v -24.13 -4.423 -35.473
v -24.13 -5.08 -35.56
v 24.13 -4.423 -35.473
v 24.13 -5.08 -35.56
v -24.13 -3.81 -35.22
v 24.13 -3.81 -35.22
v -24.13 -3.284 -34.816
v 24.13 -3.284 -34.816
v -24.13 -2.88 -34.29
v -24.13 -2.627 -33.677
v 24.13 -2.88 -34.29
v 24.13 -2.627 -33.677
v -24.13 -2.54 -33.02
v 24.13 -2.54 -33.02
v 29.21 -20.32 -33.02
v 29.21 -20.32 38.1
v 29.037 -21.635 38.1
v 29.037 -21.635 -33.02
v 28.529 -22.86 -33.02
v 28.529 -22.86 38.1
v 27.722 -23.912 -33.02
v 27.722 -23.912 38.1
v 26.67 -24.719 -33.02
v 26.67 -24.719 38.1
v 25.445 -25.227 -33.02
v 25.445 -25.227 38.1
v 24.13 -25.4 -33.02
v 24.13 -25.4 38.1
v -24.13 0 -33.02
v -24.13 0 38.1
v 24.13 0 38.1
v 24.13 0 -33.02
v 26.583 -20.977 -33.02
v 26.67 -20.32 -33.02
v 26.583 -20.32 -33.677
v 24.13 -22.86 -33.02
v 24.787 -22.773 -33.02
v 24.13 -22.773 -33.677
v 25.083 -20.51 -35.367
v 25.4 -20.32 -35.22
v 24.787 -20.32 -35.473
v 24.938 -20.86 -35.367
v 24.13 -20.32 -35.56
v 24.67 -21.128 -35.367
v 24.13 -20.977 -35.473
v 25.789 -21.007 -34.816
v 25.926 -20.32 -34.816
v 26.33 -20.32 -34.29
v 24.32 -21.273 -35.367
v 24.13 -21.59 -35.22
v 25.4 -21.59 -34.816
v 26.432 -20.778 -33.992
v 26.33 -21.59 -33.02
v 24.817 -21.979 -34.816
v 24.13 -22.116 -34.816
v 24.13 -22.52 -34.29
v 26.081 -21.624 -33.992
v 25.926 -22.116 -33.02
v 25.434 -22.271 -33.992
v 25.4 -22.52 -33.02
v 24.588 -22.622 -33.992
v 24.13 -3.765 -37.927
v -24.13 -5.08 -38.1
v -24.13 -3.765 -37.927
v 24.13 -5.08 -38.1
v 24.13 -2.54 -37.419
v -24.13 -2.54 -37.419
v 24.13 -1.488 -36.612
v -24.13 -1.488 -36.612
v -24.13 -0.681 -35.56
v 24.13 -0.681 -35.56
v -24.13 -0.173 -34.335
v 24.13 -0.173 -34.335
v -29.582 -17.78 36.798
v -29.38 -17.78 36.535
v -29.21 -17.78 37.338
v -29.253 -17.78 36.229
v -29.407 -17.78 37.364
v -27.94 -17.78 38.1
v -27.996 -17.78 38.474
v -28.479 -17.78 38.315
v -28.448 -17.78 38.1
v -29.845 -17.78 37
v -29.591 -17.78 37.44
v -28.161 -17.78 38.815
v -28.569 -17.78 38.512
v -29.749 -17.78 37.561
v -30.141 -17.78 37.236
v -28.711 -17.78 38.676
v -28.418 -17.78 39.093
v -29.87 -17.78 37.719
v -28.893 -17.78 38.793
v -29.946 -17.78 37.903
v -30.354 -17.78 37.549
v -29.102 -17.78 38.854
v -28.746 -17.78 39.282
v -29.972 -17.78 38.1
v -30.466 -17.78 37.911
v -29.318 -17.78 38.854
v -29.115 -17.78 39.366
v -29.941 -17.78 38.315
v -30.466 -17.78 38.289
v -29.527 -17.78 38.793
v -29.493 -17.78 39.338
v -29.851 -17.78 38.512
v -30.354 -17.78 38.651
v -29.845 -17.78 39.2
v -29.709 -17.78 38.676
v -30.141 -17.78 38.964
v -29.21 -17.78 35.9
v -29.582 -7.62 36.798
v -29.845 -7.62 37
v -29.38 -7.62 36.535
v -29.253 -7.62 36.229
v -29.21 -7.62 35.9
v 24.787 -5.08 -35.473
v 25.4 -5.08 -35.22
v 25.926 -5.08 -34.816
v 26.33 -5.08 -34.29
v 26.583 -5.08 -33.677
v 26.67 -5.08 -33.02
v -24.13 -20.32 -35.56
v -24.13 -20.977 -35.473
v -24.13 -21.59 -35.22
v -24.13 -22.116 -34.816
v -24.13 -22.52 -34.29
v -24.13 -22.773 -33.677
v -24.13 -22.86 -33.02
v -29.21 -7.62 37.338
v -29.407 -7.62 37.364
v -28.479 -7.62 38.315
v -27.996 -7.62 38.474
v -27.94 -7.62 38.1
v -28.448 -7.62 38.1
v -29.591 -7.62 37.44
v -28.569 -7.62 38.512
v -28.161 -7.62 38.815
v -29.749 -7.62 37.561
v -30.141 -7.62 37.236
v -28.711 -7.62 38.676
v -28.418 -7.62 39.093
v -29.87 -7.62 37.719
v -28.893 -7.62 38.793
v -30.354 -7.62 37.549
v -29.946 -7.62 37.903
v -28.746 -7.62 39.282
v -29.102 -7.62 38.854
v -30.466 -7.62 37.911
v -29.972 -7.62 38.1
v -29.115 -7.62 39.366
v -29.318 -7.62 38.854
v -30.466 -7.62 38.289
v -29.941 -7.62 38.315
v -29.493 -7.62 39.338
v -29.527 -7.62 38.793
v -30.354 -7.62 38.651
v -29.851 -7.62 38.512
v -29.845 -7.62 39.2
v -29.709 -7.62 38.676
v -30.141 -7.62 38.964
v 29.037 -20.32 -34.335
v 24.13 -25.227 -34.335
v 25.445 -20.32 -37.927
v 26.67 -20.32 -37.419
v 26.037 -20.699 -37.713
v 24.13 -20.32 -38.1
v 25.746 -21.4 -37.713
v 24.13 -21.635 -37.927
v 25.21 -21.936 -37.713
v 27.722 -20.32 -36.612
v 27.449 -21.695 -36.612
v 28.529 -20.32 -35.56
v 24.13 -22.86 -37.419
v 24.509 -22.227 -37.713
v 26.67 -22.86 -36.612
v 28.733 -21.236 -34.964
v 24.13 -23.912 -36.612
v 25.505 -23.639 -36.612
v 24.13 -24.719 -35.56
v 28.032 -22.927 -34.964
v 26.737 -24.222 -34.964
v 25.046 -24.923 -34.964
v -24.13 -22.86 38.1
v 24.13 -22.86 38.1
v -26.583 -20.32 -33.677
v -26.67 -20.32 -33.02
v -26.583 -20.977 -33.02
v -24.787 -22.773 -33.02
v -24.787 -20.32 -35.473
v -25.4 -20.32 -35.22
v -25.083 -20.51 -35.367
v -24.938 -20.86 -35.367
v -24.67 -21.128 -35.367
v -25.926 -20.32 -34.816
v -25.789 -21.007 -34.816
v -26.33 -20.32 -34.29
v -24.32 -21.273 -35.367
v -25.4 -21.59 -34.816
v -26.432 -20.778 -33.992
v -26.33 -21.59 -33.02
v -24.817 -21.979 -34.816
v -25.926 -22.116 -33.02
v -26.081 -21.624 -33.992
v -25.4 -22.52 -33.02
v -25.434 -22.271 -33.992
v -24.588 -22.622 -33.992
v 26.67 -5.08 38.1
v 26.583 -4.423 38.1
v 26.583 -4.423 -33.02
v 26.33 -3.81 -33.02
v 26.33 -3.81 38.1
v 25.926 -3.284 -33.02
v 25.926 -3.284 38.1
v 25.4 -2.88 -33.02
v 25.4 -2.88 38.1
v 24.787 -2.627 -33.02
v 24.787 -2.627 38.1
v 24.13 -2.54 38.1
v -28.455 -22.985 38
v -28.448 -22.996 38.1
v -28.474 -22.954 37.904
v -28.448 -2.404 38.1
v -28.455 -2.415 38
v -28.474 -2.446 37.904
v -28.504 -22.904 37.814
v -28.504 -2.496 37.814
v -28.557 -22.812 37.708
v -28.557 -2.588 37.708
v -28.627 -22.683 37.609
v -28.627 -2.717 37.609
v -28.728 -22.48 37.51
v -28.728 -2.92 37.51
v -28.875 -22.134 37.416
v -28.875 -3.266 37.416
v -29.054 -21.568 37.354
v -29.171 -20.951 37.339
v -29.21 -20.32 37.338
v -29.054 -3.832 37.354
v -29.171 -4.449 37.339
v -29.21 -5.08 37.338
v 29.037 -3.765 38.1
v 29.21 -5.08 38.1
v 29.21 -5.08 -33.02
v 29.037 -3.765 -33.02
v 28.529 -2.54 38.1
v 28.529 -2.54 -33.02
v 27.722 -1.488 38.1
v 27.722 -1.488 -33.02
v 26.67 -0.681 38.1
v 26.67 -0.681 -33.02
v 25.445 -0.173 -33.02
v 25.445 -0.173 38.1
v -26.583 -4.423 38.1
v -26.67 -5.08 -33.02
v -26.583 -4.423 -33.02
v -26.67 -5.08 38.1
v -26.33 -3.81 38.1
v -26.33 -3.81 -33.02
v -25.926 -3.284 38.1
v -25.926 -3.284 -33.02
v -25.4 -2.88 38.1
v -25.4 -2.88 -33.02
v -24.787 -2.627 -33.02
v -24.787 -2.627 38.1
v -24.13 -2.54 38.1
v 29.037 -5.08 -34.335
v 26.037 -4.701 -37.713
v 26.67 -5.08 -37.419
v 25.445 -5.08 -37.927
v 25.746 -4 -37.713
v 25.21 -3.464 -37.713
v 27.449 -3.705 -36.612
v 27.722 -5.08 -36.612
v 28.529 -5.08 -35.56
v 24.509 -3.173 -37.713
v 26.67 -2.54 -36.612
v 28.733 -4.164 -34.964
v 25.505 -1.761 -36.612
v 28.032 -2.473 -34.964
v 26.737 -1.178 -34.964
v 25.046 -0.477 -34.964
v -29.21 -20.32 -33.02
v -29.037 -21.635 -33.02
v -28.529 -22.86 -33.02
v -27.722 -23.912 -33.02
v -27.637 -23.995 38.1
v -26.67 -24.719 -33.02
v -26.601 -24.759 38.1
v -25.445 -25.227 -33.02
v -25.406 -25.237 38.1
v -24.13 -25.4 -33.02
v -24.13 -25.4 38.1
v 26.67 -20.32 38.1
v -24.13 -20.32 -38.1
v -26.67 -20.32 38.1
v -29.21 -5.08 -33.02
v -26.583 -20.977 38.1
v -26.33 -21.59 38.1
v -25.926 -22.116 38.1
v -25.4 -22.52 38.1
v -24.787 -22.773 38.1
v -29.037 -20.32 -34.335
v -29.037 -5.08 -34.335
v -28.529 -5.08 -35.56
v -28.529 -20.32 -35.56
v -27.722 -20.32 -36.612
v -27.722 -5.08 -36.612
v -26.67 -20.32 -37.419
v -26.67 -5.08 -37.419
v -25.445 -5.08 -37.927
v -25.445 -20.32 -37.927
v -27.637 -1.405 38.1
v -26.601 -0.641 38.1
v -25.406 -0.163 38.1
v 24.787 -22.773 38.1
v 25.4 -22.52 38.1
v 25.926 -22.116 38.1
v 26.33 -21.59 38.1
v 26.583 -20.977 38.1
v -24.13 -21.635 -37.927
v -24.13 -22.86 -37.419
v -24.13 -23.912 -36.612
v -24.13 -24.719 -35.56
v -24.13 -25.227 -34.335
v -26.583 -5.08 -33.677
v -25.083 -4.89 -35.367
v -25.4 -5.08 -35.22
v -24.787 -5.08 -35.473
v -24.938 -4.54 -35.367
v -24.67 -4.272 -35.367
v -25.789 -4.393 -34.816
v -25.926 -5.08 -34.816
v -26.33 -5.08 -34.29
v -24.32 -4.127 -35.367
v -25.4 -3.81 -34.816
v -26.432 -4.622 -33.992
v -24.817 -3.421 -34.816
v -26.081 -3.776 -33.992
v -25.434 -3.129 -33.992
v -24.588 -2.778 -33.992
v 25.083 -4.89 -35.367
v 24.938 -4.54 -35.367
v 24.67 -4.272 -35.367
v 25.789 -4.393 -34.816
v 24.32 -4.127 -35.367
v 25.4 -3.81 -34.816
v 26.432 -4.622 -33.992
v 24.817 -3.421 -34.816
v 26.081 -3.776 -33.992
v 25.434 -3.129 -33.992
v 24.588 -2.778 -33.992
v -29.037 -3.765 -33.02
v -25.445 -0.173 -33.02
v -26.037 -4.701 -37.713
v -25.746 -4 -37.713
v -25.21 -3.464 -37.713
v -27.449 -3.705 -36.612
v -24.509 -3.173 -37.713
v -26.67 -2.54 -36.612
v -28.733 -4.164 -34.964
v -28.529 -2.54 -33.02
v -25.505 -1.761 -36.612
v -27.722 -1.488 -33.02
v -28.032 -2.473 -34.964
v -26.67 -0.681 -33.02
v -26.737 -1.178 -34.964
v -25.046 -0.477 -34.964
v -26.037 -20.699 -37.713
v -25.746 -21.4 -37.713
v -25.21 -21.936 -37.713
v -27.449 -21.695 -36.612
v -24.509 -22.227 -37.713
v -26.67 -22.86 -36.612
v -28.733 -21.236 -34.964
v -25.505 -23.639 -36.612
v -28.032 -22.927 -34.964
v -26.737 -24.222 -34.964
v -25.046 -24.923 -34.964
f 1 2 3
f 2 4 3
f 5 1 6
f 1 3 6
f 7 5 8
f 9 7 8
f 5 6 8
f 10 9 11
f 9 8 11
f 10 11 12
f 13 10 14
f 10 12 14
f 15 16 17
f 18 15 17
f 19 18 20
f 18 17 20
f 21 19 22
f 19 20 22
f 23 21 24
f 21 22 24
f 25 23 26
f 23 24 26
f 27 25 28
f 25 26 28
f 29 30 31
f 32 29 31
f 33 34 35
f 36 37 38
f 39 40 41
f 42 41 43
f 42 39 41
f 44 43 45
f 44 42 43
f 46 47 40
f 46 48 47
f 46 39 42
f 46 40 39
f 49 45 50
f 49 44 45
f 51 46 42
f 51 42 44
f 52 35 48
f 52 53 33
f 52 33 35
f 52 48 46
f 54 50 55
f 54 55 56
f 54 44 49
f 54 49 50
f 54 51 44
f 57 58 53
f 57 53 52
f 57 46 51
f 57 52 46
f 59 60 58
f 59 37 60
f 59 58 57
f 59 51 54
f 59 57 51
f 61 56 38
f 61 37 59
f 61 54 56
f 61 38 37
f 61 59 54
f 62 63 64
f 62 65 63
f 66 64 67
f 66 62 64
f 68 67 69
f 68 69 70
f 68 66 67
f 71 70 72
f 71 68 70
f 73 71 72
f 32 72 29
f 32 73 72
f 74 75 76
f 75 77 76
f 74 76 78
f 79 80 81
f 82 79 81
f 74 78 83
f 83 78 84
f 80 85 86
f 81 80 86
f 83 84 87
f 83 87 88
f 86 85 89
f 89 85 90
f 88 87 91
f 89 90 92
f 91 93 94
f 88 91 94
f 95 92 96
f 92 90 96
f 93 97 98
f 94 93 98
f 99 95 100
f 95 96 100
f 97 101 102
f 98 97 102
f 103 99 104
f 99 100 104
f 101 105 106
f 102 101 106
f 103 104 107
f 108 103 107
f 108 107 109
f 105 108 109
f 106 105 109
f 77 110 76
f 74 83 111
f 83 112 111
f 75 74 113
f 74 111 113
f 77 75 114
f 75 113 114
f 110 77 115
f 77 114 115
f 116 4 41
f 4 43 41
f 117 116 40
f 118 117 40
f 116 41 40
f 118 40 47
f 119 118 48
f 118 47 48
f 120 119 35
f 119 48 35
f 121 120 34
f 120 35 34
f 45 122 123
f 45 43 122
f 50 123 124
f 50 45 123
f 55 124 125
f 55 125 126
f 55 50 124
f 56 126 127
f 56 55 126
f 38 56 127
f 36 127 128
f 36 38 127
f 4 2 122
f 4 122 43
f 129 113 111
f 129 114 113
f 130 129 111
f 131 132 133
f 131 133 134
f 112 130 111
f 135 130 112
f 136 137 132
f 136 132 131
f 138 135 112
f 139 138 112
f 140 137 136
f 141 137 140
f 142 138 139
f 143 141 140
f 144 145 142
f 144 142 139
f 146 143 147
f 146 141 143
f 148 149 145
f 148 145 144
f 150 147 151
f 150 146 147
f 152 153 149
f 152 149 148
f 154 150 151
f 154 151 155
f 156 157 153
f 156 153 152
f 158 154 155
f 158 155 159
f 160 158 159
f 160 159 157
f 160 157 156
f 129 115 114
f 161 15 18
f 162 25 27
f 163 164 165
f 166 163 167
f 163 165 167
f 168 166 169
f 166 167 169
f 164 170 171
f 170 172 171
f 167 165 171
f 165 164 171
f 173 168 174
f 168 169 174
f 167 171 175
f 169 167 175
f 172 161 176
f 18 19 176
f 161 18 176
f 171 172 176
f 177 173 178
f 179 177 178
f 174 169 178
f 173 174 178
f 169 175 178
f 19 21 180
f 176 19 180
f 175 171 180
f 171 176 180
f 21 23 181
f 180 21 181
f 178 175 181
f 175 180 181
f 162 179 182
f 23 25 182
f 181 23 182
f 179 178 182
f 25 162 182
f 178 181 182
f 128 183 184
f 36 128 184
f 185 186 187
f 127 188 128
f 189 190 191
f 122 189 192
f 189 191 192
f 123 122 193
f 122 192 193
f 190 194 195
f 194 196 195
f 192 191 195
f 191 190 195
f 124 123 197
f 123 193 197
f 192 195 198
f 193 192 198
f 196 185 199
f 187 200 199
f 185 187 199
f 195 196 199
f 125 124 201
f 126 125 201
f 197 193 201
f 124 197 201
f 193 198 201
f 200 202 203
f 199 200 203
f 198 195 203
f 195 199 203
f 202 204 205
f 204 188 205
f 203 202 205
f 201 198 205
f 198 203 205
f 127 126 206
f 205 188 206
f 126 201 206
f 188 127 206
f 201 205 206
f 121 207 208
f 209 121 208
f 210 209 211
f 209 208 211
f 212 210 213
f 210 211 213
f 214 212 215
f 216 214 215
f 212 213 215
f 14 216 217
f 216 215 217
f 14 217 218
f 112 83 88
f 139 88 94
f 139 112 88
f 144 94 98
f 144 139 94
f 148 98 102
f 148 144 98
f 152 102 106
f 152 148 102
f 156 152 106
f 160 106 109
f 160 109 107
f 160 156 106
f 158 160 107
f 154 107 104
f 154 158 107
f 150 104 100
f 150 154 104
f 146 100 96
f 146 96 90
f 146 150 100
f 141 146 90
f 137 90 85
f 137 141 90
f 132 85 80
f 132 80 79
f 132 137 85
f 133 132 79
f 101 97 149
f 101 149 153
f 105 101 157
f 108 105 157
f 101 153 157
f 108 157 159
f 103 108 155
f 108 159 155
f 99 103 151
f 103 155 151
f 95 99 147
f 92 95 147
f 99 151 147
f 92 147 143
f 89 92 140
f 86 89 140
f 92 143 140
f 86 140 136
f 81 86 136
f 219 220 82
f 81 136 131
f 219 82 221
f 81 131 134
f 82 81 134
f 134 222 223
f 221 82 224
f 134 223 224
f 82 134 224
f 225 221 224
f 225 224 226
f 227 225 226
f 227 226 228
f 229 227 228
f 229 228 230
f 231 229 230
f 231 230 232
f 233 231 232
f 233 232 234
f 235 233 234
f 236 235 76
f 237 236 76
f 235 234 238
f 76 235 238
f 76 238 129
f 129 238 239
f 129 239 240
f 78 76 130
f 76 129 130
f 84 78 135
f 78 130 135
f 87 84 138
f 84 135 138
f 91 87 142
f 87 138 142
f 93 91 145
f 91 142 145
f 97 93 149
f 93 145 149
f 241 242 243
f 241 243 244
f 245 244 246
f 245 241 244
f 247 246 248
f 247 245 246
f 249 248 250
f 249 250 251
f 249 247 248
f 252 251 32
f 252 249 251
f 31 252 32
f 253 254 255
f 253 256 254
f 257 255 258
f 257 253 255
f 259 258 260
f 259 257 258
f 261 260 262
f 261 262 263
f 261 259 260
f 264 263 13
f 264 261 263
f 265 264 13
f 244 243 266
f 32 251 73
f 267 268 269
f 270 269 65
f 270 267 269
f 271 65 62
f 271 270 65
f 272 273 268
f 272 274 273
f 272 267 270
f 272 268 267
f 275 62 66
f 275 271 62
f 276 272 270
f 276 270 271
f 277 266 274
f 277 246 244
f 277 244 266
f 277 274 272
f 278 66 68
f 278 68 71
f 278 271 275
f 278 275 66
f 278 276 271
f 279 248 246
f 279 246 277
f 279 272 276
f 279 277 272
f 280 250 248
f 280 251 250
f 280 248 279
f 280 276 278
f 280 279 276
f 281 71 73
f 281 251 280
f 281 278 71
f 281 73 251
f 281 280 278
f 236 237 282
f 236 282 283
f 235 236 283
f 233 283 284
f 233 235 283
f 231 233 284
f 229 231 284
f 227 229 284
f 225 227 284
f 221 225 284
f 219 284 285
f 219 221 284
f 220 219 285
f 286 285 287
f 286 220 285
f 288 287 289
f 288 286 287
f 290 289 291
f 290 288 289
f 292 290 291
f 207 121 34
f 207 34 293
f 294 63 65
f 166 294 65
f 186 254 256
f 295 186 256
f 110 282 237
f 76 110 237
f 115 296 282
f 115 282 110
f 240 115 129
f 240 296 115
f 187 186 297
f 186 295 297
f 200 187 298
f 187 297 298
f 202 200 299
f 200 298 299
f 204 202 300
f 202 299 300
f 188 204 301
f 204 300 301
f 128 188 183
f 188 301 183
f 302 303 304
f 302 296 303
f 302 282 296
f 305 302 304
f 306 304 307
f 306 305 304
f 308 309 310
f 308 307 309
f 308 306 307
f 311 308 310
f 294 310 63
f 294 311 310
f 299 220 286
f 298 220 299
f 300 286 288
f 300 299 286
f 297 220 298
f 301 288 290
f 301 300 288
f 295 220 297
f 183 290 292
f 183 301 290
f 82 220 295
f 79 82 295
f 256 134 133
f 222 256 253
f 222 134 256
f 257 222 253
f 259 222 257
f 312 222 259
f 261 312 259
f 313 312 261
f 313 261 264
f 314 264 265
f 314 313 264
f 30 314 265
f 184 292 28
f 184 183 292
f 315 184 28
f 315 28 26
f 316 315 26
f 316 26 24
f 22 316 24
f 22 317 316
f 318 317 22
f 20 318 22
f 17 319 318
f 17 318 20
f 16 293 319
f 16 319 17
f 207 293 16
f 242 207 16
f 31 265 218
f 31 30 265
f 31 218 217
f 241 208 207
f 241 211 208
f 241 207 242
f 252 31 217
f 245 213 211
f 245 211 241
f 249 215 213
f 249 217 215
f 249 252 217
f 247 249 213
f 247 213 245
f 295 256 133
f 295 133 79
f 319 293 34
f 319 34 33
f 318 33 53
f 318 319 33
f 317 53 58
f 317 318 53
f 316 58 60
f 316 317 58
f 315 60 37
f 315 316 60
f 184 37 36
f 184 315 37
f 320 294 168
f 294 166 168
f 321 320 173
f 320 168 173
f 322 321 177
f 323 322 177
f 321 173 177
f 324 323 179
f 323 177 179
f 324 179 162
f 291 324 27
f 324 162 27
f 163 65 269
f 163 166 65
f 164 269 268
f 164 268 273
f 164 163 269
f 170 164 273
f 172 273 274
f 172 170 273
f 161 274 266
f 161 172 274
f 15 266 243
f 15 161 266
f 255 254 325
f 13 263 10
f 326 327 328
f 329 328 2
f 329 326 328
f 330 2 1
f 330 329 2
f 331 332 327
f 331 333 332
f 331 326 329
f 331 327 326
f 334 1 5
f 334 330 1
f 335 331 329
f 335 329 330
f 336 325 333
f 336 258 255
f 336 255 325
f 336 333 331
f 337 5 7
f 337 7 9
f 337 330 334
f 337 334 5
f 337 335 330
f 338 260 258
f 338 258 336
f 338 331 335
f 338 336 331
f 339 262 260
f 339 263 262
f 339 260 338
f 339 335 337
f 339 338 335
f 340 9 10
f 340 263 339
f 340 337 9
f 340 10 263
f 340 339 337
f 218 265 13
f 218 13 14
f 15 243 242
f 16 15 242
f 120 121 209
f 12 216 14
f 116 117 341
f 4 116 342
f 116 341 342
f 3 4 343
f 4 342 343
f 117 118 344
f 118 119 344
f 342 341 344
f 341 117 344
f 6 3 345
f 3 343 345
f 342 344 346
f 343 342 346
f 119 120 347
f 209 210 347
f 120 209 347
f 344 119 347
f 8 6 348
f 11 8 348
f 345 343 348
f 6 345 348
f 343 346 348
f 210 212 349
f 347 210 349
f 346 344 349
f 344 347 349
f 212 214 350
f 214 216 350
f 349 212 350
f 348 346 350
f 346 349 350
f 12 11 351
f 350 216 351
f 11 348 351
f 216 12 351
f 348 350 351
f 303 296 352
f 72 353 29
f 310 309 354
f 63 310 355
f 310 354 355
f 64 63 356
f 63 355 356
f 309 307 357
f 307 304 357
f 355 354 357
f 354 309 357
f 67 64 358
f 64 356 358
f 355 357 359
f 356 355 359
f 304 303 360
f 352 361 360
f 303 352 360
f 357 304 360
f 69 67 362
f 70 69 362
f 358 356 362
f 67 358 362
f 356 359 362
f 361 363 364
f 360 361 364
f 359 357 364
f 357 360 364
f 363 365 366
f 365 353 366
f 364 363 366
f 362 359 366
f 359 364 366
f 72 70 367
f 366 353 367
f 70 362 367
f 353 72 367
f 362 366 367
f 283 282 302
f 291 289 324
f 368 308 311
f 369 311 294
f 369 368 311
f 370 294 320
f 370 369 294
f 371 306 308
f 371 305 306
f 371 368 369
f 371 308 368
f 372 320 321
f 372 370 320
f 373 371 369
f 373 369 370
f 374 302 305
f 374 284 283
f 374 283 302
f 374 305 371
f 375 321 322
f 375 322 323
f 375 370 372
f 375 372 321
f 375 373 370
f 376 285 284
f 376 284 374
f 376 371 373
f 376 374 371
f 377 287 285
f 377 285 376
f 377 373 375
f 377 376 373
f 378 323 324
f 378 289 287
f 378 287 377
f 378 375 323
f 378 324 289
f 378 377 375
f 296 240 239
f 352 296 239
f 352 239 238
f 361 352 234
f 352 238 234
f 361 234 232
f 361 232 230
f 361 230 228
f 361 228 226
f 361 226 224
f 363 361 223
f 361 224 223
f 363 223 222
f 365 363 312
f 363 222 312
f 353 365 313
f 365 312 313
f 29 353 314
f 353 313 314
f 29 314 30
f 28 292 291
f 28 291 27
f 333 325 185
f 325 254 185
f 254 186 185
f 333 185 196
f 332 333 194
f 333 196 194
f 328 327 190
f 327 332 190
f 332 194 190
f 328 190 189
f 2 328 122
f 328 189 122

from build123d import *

# Parameters (mm, degrees)
F0_W     = 58.42
F0_H     = 76.2
F1_DEPTH = 25.4
F2_R     = 5.08
F3_T     = -2.54
F5_R     = 1.27
F6_DEPTH = 5.08
F7_R     = 1.27
F8_R     = 0.762
F9_DEPTH = 76.2


with BuildPart() as f1:
    # F0 (on Front) → F1 (new body)
    with BuildSketch(Plane.XZ):
        Rectangle(F0_W, F0_H)
    extrude(amount=F1_DEPTH)

    # F2
    f2_edges = [f1.edges().sort_by_distance(p)[0] for p in [
        (-29.21, -25.4, 0),
        (29.21, -25.4, 0),
        (29.21, 0, 0),
        (-29.21, 0, 0),
        (-29.21, -12.7, -38.1),
        (29.21, -12.7, -38.1),
        (0, 0, -38.1),
        (0, -25.4, -38.1),
    ]]
    fillet(f2_edges, radius=F2_R)

    # F3
    f3_openings = [f1.faces().sort_by_distance(p)[0] for p in [
        (0, -12.7, 38.1),
    ]]
    offset(amount=F3_T, openings=f3_openings)

    # F5 (on offset) → F6 (join, symmetric)
    with BuildSketch(Plane(origin=(0, -12.7, 0), x_dir=(-1, 0, 0), z_dir=(0, 1, 0))):
        with Locations((29.21, 38.1)):
            Circle(F5_R)
    extrude(amount=F6_DEPTH, both=True)

    # F7
    f7_edges = [f1.edges().sort_by_distance(p)[0] for p in [
        (-29.21, -12.7, 36.83),
    ]]
    fillet(f7_edges, radius=F7_R)

    # F8 (on face) → F9 (cut, symmetric)
    with BuildSketch(Plane(origin=(0, -7.62, 0), x_dir=(-1, 0, 0), z_dir=(0, 1, 0))):
        with Locations((29.21, 38.1)):
            Circle(F8_R)
    extrude(amount=F9_DEPTH, both=True, mode=Mode.SUBTRACT)


solid = f1.part
